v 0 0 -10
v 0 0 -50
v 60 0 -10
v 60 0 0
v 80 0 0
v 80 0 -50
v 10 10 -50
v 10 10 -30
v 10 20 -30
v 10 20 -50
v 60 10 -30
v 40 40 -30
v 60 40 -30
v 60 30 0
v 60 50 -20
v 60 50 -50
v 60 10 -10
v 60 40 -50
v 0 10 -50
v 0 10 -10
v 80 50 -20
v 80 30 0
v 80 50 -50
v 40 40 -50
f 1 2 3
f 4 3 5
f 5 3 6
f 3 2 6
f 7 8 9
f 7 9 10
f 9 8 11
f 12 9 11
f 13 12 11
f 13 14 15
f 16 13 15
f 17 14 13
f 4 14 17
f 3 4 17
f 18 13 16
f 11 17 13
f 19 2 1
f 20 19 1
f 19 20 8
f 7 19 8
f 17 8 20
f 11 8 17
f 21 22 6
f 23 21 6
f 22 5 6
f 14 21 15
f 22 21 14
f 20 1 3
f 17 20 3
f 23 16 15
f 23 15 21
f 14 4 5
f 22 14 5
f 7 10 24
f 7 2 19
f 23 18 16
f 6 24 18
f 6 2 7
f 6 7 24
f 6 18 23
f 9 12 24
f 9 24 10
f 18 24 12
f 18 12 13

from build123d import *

# Parameters (mm, degrees)
BOSS_EXTRUDE1_DEPTH = 10
SKETCH3_W           = 20
SKETCH3_H           = 50
BOSS_EXTRUDE2_DEPTH = 40
CUT_EXTRUDE1_DEPTH  = 40
SKETCH5_W           = 50
SKETCH5_H           = 20
BOSS_EXTRUDE3_DEPTH = 30
CUT_EXTRUDE2_DEPTH  = 30


with BuildPart() as part:
    # Sketch2 → Boss-Extrude1 (new body)
    with BuildSketch(Plane(origin=(0, 0, 0), x_dir=(1, 0, 0), z_dir=(0, 1, 0))):
        Polygon((0, 50), (0, 10), (60, 10), (60, 0), (80, 0), (80, 50), align=None)
    extrude(amount=BOSS_EXTRUDE1_DEPTH)

    # Sketch3 → Boss-Extrude2 (add)
    with BuildSketch(Plane(origin=(0, 10, 0), x_dir=(1, 0, 0), z_dir=(0, 1, 0))):
        with Locations((70, 25)):
            Rectangle(SKETCH3_W, SKETCH3_H)
    extrude(amount=BOSS_EXTRUDE2_DEPTH)

    # Sketch4 → Cut-Extrude1 (cut)
    with BuildSketch(Plane(origin=(80, 0, 0), x_dir=(0, 0, -1), z_dir=(1, 0, 0))):
        Polygon((20, 50), (0, 30), (0, 50), align=None)
    extrude(amount=-CUT_EXTRUDE1_DEPTH, mode=Mode.SUBTRACT)

    # Sketch5 → Boss-Extrude3 (add)
    with BuildSketch(Plane(origin=(0, 10, 0), x_dir=(1, 0, 0), z_dir=(0, 1, 0))):
        with Locations((35, 40)):
            Rectangle(SKETCH5_W, SKETCH5_H)
    extrude(amount=BOSS_EXTRUDE3_DEPTH)

    # Sketch6 → Cut-Extrude2 (cut)
    with BuildSketch(Plane.XY.offset(-30)):
        Polygon((40, 40), (10, 20), (10, 40), align=None)
    extrude(amount=-CUT_EXTRUDE2_DEPTH, mode=Mode.SUBTRACT)


solid = part.part
